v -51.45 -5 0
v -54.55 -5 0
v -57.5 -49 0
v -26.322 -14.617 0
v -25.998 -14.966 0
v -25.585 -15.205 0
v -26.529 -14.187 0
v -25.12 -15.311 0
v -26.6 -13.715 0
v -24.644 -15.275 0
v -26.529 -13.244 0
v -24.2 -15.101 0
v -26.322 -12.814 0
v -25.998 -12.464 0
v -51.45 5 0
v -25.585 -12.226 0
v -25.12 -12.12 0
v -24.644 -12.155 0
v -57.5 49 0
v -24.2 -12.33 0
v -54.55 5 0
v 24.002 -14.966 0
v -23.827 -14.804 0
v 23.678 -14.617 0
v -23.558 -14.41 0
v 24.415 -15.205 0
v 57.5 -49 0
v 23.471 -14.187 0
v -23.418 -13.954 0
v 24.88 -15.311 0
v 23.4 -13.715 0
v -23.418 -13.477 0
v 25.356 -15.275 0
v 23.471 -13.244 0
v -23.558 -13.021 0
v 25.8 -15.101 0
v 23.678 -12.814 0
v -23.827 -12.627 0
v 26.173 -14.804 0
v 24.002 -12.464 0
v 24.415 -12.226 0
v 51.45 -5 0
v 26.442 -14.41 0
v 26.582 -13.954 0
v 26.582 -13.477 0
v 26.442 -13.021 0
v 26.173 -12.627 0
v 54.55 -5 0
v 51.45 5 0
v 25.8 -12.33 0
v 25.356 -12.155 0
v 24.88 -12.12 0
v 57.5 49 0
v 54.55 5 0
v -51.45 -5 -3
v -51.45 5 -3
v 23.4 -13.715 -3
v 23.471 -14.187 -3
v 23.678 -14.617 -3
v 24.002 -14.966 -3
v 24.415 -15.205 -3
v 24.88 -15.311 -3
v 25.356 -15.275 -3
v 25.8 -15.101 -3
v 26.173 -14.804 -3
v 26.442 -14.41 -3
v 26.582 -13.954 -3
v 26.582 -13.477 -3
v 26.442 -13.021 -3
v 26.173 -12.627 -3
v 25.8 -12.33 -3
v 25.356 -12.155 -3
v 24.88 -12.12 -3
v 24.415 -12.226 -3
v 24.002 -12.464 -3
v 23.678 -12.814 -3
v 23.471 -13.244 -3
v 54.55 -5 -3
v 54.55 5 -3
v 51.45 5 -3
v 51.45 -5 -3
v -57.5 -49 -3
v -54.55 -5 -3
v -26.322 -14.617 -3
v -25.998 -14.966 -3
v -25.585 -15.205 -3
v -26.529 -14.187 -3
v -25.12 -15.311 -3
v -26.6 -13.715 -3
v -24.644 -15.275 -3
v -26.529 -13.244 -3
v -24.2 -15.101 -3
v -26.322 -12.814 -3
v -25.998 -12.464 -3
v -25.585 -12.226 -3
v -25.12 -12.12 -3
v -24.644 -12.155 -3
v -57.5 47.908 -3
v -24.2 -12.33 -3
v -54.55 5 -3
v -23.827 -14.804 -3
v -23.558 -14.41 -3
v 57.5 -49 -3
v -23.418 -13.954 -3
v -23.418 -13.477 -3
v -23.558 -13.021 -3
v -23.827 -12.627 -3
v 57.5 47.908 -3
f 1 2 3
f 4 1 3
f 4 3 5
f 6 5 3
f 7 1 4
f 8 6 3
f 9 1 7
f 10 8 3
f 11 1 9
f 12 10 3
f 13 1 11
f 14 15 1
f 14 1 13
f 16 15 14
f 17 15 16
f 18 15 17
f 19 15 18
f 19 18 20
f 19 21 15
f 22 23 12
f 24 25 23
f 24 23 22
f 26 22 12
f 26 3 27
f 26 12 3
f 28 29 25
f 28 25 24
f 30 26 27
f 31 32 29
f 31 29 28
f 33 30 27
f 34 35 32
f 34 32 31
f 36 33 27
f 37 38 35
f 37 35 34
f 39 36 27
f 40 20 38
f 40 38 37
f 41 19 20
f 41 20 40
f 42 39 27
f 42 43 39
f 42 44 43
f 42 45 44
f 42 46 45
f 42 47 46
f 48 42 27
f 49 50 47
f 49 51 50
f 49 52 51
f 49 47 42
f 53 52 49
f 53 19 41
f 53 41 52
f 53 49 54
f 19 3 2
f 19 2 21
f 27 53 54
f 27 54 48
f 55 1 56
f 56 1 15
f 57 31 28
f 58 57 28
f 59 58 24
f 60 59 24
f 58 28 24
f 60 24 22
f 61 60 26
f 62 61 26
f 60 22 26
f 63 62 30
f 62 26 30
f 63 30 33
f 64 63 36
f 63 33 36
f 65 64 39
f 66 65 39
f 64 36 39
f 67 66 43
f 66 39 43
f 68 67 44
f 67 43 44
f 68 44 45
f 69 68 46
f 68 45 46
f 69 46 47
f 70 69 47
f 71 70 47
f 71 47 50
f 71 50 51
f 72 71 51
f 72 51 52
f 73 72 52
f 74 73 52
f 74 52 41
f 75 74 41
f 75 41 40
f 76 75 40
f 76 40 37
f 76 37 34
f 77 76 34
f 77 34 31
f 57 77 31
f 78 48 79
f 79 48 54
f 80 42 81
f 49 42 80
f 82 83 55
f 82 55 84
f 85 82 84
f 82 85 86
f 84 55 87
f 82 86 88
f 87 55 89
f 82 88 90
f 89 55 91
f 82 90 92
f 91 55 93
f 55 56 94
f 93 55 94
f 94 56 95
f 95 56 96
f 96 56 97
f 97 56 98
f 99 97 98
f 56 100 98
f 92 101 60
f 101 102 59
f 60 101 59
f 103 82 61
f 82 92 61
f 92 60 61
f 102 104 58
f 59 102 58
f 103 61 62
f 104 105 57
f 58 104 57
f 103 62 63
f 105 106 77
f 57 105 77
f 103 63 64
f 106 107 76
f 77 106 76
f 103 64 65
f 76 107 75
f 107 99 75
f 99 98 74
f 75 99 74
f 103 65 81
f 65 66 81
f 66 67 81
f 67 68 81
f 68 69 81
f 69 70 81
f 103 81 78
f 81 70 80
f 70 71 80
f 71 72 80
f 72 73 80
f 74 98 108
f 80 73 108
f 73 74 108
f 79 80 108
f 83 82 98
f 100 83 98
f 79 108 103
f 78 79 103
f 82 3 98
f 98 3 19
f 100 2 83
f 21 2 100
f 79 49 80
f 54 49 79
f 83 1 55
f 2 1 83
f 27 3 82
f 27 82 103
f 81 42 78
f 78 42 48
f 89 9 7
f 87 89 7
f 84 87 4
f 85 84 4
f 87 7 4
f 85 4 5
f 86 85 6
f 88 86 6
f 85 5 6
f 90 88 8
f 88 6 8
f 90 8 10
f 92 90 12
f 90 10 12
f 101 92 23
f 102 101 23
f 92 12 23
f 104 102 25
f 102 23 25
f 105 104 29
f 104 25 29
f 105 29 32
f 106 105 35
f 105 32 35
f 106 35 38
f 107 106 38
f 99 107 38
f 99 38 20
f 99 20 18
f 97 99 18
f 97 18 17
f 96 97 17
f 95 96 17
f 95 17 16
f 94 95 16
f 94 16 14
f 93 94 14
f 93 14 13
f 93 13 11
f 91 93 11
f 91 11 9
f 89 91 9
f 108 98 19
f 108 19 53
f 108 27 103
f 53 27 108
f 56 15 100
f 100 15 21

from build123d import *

# Parameters (mm, degrees)
F0_W     = 115
F0_H     = 98
F1_DEPTH = 3
F2_W     = 3.1
F2_H     = 10
F3_DEPTH = 3
F4_SIZE2 = 1.091901
F4_SIZE  = 2.99999
F8_D     = 3.2
F8_DEPTH = 5
F8_TIP   = 0.9613769904


# Not quite as in the source:
# - a fillet or chamfer is up to 0.001 mm smaller than in the source, because OpenCascade refuses the exact size
# - a pattern or mirror of a feature is missing from the dataset's text; its kind, count and spacing are read off the source's solid


with BuildPart() as f1:
    # F0 (on Top) → F1 (new body)
    with BuildSketch(Plane.XY):
        Rectangle(F0_W, F0_H)
    extrude(amount=-F1_DEPTH)

    # F2 (on face) → F3 (cut, through all)
    with BuildSketch(Plane.XY):
        with Locations((53, 0)):
            Rectangle(F2_W, F2_H)
    f3 = extrude(amount=-F3_DEPTH, mode=Mode.SUBTRACT)

    # F3_copies: F3 across plane
    add(f3.mirror(Plane(origin=(0, 0, 0), x_dir=(0, 0, -1), z_dir=(-1, 0, 0))), mode=Mode.SUBTRACT)

    # F4 (size 3 and 1.0919107028 in the source; OpenCascade refuses exactly that, so slightly less here)
    f4_edges = [f1.edges().sort_by_distance(p)[0] for p in [
        (0, 49, -3),
    ]]
    f4_side = f1.faces().sort_by_distance((0, 49, -1.5))[0]
    chamfer(f4_edges, length=F4_SIZE, length2=F4_SIZE2, reference=f4_side)

    # F8
    with Locations(Plane(origin=(0, 0, -3), x_dir=(1, 0, 0), z_dir=(0, 0, -1))):
        with Locations((25, 13.7153716188), (-25, 13.7153716188)):
            Hole(F8_D / 2, depth=F8_DEPTH)
            with Locations((0, 0, -(F8_DEPTH + F8_TIP / 2))):  # 118° drill point
                Cone(0, F8_D / 2, F8_TIP, mode=Mode.SUBTRACT)


solid = f1.part
